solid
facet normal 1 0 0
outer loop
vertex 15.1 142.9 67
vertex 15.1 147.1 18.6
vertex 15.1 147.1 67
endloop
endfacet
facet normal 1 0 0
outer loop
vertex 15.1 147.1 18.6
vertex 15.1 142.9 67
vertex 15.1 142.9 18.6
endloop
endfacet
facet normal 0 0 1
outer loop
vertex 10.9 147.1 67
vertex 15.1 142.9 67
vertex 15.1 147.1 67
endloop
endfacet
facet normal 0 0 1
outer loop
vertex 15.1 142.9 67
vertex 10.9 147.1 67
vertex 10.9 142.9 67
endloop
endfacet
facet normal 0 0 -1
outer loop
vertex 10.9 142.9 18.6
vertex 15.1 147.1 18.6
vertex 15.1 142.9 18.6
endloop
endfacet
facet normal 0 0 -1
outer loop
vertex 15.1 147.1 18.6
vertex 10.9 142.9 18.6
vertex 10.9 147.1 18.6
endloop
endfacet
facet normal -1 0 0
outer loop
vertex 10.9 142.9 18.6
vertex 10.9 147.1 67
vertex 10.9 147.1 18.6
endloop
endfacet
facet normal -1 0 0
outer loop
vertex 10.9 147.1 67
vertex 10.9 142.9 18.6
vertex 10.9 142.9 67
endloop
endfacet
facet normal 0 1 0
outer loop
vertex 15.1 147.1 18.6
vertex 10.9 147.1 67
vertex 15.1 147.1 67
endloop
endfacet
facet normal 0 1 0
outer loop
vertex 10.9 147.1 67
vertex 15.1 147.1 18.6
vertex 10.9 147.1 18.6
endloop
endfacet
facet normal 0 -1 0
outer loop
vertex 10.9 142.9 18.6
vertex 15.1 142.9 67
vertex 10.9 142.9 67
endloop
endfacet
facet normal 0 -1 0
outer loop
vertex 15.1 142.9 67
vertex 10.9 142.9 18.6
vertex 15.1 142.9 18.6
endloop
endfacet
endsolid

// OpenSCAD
// Generated by spec/prepare_parent_retrofit_printing.py from validated release fasteners. NOT A PRINTABLE PART.
union(){
translate([10.9, 142.9, 18.599999237060548]) cube([4.2, 4.2, 48.400003814697264]);
translate([10.9, 142.9, 18.599999237060548]) cube([4.2, 4.2, 48.400003814697264]);
}
